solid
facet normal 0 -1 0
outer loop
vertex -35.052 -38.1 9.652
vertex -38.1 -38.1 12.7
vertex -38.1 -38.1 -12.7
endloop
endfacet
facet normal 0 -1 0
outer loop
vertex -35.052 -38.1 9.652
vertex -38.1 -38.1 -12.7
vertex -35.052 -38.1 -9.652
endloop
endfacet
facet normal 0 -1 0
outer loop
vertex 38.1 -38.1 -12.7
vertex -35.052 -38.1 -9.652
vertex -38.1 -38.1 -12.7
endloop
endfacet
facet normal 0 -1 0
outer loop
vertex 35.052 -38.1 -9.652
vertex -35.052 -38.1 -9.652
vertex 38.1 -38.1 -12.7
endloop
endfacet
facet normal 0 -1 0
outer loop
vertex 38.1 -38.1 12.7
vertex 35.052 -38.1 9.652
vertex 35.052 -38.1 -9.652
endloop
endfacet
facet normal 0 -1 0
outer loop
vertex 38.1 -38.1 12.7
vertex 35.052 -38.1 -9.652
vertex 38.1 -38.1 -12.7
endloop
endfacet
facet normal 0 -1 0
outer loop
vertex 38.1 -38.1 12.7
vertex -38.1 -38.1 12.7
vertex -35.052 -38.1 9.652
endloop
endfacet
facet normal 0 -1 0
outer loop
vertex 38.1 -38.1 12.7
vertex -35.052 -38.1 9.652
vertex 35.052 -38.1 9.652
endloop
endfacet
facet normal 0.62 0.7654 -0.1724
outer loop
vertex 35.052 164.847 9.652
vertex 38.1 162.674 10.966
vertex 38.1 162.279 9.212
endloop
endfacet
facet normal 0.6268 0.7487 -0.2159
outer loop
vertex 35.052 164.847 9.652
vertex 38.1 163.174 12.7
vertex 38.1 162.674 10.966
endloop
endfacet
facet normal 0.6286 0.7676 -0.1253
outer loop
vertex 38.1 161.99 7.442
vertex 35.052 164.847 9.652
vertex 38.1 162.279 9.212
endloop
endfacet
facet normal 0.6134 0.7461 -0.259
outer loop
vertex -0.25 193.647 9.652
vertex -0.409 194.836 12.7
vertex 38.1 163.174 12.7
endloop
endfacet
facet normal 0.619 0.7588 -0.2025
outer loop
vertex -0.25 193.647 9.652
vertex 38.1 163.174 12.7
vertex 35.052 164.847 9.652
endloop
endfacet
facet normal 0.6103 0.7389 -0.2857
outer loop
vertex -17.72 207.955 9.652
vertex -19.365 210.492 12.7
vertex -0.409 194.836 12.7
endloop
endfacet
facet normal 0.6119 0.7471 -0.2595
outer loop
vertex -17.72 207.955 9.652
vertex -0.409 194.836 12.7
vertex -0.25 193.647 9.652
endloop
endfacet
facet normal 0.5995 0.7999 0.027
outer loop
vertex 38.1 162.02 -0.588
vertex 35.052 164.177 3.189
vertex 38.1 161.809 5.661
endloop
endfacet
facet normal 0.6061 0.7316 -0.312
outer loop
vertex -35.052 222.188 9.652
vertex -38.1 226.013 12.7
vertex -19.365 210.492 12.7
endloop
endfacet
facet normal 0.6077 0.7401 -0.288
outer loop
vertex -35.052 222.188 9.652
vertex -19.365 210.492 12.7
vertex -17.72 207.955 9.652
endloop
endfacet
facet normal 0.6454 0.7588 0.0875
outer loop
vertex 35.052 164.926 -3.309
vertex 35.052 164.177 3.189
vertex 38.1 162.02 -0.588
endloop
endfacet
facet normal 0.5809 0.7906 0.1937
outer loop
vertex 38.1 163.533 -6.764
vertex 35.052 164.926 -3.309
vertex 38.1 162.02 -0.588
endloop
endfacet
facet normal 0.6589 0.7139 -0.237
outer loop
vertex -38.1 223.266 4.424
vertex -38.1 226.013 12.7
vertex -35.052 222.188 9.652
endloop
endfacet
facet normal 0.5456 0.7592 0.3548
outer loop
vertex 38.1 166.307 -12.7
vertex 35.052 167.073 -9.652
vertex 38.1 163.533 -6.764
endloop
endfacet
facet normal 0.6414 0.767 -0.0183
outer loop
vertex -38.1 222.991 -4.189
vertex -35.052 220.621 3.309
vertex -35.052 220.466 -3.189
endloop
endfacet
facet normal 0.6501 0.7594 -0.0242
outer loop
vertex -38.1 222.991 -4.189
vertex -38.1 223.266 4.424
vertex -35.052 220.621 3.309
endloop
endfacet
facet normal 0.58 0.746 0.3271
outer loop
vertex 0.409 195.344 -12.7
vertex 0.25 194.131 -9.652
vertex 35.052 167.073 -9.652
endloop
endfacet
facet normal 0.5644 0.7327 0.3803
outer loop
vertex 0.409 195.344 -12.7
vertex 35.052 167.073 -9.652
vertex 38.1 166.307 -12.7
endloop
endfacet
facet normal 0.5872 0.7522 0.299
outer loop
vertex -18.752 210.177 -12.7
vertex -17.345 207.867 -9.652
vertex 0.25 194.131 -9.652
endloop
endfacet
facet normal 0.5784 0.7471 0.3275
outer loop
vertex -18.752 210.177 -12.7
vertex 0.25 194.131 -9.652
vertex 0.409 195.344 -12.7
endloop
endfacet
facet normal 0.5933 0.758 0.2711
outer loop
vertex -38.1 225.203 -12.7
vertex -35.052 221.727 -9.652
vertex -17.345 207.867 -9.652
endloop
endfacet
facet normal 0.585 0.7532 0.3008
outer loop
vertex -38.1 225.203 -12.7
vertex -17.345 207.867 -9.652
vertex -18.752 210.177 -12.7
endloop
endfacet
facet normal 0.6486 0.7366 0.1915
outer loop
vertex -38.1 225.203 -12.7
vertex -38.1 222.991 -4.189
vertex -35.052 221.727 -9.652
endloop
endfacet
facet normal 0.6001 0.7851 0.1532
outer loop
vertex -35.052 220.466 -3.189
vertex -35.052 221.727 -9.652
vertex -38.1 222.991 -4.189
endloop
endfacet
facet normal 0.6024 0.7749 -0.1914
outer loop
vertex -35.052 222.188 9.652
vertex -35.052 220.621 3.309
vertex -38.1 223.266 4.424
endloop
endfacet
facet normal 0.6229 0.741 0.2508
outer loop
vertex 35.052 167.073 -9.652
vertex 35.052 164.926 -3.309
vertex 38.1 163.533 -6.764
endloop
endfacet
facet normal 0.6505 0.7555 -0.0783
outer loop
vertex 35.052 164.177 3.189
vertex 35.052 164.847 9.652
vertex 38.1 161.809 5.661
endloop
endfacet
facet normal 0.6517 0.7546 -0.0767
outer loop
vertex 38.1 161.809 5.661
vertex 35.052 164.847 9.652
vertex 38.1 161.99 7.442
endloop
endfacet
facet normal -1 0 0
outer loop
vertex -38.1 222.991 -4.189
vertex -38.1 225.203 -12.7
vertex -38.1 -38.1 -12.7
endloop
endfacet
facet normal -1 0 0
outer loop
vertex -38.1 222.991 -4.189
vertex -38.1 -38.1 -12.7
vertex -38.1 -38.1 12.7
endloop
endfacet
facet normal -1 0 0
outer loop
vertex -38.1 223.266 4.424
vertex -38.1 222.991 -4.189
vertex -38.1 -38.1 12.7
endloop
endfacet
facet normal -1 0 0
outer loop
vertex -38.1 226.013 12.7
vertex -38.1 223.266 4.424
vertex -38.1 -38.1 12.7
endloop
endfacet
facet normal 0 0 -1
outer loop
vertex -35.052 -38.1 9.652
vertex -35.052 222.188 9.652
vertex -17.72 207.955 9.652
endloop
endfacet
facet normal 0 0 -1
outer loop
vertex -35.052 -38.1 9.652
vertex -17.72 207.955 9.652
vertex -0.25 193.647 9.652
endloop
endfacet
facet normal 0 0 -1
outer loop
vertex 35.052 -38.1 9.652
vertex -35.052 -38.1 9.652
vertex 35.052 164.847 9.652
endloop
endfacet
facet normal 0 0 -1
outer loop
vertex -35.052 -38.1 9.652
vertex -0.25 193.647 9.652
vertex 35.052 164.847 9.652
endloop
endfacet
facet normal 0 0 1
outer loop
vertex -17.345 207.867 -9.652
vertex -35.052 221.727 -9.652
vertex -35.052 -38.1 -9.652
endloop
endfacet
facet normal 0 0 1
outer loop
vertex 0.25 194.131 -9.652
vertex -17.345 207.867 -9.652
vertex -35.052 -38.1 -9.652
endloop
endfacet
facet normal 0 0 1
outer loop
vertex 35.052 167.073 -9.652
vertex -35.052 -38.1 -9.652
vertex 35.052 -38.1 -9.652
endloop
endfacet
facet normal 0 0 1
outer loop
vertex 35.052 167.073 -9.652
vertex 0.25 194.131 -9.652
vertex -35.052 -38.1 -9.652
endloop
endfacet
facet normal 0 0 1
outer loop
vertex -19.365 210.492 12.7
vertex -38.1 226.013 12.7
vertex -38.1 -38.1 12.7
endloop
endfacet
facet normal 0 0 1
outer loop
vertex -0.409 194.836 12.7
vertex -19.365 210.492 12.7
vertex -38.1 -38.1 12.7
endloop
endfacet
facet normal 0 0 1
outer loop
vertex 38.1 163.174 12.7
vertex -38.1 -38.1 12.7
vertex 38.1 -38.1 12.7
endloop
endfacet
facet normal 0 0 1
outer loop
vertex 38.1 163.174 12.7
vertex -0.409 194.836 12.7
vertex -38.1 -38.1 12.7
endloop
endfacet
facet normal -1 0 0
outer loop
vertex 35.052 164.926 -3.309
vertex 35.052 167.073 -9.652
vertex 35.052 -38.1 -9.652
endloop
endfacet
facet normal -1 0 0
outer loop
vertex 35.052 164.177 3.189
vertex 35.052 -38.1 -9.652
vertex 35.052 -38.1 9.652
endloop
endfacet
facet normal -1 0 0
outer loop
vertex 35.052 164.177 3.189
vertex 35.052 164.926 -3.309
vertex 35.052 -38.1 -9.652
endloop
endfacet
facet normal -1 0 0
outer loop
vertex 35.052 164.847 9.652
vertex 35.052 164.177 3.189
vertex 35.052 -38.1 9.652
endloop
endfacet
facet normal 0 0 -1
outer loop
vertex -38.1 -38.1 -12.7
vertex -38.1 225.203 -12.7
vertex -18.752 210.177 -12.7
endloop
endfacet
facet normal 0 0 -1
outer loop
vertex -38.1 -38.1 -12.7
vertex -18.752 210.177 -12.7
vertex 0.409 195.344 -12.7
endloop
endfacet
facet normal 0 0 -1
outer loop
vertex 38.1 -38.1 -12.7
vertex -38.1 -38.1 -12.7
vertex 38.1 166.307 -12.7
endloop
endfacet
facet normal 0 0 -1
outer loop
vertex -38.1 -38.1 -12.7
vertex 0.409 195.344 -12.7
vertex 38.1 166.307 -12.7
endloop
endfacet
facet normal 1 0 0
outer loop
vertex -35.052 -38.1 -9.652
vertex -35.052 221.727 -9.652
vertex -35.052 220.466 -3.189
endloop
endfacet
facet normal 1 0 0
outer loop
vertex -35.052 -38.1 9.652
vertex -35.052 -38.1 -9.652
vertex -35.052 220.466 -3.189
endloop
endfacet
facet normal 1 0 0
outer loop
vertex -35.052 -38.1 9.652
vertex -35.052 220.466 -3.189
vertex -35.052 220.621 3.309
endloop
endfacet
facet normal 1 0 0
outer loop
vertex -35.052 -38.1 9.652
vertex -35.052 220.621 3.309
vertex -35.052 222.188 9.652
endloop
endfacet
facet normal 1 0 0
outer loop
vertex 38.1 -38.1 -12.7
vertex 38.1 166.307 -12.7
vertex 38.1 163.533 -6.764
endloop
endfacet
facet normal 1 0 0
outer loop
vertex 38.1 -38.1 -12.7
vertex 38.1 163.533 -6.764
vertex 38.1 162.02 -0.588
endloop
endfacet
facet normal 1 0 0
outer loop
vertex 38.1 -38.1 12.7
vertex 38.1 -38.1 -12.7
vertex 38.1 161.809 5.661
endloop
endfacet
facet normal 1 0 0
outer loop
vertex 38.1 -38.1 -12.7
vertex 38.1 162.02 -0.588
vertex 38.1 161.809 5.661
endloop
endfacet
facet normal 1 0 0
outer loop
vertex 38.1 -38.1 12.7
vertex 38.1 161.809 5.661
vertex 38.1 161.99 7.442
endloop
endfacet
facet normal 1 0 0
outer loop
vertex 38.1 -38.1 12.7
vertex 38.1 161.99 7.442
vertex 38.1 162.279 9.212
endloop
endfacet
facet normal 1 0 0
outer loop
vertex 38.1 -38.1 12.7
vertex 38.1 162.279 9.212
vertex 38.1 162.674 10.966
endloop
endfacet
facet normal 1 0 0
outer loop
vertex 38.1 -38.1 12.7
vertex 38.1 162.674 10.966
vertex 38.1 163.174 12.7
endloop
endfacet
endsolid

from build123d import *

# Parameters (mm, degrees)
SKETCH1_W           = 76.2
SKETCH1_H           = 25.4
SKETCH1_W_2         = 70.104
SKETCH1_H_2         = 19.304
BOSS_EXTRUDE1_DEPTH = 241.091915
SKETCH3_W           = 76.2
SKETCH3_H           = 25.4
SKETCH3_W_2         = 70.104
SKETCH3_H_2         = 19.304
BOSS_EXTRUDE2_DEPTH = 3.048
SKETCH4_W           = 76.2
SKETCH4_H           = 25.4
SKETCH4_W_2         = 70.104
SKETCH4_H_2         = 19.304
BOSS_EXTRUDE3_DEPTH = 38.1
CUT_EXTRUDE2_START  = 105.580594
SKETCH5_R           = 38.1
CUT_EXTRUDE2_DEPTH  = 111.6566


with BuildPart() as part:
    # Sketch1 → Boss-Extrude1 (new body)
    with BuildSketch(Plane(origin=(0, 0, 0), x_dir=(1, 0, 0), z_dir=(0, 1, 0))):
        Rectangle(SKETCH1_W, SKETCH1_H)
        Rectangle(SKETCH1_W_2, SKETCH1_H_2, mode=Mode.SUBTRACT)
    extrude(amount=BOSS_EXTRUDE1_DEPTH)

    # Sketch3 → Boss-Extrude2 (add)
    with BuildSketch(Plane(origin=(0, 241.09191526, 0), x_dir=(1, 0, 0), z_dir=(0, 1, 0))):
        Rectangle(SKETCH3_W, SKETCH3_H)
        Rectangle(SKETCH3_W_2, SKETCH3_H_2, mode=Mode.SUBTRACT)
    extrude(amount=BOSS_EXTRUDE2_DEPTH)

    # Sketch4 → Boss-Extrude3 (add)
    with BuildSketch(Plane.XZ):
        Rectangle(SKETCH4_W, SKETCH4_H)
        Rectangle(SKETCH4_W_2, SKETCH4_H_2, mode=Mode.SUBTRACT)
    extrude(amount=BOSS_EXTRUDE3_DEPTH)

    # Sketch5 → Cut-Extrude2 (cut)
    with BuildSketch(Plane(origin=(-107.386524849, 327.150922863, -6.145385199), x_dir=(0.03097261, -0.032688156, -0.998985576), z_dir=(0.779560672, -0.624735905, 0.044611748)).offset(CUT_EXTRUDE2_START)):
        Circle(SKETCH5_R)
    extrude(amount=CUT_EXTRUDE2_DEPTH, mode=Mode.SUBTRACT)


solid = part.part
